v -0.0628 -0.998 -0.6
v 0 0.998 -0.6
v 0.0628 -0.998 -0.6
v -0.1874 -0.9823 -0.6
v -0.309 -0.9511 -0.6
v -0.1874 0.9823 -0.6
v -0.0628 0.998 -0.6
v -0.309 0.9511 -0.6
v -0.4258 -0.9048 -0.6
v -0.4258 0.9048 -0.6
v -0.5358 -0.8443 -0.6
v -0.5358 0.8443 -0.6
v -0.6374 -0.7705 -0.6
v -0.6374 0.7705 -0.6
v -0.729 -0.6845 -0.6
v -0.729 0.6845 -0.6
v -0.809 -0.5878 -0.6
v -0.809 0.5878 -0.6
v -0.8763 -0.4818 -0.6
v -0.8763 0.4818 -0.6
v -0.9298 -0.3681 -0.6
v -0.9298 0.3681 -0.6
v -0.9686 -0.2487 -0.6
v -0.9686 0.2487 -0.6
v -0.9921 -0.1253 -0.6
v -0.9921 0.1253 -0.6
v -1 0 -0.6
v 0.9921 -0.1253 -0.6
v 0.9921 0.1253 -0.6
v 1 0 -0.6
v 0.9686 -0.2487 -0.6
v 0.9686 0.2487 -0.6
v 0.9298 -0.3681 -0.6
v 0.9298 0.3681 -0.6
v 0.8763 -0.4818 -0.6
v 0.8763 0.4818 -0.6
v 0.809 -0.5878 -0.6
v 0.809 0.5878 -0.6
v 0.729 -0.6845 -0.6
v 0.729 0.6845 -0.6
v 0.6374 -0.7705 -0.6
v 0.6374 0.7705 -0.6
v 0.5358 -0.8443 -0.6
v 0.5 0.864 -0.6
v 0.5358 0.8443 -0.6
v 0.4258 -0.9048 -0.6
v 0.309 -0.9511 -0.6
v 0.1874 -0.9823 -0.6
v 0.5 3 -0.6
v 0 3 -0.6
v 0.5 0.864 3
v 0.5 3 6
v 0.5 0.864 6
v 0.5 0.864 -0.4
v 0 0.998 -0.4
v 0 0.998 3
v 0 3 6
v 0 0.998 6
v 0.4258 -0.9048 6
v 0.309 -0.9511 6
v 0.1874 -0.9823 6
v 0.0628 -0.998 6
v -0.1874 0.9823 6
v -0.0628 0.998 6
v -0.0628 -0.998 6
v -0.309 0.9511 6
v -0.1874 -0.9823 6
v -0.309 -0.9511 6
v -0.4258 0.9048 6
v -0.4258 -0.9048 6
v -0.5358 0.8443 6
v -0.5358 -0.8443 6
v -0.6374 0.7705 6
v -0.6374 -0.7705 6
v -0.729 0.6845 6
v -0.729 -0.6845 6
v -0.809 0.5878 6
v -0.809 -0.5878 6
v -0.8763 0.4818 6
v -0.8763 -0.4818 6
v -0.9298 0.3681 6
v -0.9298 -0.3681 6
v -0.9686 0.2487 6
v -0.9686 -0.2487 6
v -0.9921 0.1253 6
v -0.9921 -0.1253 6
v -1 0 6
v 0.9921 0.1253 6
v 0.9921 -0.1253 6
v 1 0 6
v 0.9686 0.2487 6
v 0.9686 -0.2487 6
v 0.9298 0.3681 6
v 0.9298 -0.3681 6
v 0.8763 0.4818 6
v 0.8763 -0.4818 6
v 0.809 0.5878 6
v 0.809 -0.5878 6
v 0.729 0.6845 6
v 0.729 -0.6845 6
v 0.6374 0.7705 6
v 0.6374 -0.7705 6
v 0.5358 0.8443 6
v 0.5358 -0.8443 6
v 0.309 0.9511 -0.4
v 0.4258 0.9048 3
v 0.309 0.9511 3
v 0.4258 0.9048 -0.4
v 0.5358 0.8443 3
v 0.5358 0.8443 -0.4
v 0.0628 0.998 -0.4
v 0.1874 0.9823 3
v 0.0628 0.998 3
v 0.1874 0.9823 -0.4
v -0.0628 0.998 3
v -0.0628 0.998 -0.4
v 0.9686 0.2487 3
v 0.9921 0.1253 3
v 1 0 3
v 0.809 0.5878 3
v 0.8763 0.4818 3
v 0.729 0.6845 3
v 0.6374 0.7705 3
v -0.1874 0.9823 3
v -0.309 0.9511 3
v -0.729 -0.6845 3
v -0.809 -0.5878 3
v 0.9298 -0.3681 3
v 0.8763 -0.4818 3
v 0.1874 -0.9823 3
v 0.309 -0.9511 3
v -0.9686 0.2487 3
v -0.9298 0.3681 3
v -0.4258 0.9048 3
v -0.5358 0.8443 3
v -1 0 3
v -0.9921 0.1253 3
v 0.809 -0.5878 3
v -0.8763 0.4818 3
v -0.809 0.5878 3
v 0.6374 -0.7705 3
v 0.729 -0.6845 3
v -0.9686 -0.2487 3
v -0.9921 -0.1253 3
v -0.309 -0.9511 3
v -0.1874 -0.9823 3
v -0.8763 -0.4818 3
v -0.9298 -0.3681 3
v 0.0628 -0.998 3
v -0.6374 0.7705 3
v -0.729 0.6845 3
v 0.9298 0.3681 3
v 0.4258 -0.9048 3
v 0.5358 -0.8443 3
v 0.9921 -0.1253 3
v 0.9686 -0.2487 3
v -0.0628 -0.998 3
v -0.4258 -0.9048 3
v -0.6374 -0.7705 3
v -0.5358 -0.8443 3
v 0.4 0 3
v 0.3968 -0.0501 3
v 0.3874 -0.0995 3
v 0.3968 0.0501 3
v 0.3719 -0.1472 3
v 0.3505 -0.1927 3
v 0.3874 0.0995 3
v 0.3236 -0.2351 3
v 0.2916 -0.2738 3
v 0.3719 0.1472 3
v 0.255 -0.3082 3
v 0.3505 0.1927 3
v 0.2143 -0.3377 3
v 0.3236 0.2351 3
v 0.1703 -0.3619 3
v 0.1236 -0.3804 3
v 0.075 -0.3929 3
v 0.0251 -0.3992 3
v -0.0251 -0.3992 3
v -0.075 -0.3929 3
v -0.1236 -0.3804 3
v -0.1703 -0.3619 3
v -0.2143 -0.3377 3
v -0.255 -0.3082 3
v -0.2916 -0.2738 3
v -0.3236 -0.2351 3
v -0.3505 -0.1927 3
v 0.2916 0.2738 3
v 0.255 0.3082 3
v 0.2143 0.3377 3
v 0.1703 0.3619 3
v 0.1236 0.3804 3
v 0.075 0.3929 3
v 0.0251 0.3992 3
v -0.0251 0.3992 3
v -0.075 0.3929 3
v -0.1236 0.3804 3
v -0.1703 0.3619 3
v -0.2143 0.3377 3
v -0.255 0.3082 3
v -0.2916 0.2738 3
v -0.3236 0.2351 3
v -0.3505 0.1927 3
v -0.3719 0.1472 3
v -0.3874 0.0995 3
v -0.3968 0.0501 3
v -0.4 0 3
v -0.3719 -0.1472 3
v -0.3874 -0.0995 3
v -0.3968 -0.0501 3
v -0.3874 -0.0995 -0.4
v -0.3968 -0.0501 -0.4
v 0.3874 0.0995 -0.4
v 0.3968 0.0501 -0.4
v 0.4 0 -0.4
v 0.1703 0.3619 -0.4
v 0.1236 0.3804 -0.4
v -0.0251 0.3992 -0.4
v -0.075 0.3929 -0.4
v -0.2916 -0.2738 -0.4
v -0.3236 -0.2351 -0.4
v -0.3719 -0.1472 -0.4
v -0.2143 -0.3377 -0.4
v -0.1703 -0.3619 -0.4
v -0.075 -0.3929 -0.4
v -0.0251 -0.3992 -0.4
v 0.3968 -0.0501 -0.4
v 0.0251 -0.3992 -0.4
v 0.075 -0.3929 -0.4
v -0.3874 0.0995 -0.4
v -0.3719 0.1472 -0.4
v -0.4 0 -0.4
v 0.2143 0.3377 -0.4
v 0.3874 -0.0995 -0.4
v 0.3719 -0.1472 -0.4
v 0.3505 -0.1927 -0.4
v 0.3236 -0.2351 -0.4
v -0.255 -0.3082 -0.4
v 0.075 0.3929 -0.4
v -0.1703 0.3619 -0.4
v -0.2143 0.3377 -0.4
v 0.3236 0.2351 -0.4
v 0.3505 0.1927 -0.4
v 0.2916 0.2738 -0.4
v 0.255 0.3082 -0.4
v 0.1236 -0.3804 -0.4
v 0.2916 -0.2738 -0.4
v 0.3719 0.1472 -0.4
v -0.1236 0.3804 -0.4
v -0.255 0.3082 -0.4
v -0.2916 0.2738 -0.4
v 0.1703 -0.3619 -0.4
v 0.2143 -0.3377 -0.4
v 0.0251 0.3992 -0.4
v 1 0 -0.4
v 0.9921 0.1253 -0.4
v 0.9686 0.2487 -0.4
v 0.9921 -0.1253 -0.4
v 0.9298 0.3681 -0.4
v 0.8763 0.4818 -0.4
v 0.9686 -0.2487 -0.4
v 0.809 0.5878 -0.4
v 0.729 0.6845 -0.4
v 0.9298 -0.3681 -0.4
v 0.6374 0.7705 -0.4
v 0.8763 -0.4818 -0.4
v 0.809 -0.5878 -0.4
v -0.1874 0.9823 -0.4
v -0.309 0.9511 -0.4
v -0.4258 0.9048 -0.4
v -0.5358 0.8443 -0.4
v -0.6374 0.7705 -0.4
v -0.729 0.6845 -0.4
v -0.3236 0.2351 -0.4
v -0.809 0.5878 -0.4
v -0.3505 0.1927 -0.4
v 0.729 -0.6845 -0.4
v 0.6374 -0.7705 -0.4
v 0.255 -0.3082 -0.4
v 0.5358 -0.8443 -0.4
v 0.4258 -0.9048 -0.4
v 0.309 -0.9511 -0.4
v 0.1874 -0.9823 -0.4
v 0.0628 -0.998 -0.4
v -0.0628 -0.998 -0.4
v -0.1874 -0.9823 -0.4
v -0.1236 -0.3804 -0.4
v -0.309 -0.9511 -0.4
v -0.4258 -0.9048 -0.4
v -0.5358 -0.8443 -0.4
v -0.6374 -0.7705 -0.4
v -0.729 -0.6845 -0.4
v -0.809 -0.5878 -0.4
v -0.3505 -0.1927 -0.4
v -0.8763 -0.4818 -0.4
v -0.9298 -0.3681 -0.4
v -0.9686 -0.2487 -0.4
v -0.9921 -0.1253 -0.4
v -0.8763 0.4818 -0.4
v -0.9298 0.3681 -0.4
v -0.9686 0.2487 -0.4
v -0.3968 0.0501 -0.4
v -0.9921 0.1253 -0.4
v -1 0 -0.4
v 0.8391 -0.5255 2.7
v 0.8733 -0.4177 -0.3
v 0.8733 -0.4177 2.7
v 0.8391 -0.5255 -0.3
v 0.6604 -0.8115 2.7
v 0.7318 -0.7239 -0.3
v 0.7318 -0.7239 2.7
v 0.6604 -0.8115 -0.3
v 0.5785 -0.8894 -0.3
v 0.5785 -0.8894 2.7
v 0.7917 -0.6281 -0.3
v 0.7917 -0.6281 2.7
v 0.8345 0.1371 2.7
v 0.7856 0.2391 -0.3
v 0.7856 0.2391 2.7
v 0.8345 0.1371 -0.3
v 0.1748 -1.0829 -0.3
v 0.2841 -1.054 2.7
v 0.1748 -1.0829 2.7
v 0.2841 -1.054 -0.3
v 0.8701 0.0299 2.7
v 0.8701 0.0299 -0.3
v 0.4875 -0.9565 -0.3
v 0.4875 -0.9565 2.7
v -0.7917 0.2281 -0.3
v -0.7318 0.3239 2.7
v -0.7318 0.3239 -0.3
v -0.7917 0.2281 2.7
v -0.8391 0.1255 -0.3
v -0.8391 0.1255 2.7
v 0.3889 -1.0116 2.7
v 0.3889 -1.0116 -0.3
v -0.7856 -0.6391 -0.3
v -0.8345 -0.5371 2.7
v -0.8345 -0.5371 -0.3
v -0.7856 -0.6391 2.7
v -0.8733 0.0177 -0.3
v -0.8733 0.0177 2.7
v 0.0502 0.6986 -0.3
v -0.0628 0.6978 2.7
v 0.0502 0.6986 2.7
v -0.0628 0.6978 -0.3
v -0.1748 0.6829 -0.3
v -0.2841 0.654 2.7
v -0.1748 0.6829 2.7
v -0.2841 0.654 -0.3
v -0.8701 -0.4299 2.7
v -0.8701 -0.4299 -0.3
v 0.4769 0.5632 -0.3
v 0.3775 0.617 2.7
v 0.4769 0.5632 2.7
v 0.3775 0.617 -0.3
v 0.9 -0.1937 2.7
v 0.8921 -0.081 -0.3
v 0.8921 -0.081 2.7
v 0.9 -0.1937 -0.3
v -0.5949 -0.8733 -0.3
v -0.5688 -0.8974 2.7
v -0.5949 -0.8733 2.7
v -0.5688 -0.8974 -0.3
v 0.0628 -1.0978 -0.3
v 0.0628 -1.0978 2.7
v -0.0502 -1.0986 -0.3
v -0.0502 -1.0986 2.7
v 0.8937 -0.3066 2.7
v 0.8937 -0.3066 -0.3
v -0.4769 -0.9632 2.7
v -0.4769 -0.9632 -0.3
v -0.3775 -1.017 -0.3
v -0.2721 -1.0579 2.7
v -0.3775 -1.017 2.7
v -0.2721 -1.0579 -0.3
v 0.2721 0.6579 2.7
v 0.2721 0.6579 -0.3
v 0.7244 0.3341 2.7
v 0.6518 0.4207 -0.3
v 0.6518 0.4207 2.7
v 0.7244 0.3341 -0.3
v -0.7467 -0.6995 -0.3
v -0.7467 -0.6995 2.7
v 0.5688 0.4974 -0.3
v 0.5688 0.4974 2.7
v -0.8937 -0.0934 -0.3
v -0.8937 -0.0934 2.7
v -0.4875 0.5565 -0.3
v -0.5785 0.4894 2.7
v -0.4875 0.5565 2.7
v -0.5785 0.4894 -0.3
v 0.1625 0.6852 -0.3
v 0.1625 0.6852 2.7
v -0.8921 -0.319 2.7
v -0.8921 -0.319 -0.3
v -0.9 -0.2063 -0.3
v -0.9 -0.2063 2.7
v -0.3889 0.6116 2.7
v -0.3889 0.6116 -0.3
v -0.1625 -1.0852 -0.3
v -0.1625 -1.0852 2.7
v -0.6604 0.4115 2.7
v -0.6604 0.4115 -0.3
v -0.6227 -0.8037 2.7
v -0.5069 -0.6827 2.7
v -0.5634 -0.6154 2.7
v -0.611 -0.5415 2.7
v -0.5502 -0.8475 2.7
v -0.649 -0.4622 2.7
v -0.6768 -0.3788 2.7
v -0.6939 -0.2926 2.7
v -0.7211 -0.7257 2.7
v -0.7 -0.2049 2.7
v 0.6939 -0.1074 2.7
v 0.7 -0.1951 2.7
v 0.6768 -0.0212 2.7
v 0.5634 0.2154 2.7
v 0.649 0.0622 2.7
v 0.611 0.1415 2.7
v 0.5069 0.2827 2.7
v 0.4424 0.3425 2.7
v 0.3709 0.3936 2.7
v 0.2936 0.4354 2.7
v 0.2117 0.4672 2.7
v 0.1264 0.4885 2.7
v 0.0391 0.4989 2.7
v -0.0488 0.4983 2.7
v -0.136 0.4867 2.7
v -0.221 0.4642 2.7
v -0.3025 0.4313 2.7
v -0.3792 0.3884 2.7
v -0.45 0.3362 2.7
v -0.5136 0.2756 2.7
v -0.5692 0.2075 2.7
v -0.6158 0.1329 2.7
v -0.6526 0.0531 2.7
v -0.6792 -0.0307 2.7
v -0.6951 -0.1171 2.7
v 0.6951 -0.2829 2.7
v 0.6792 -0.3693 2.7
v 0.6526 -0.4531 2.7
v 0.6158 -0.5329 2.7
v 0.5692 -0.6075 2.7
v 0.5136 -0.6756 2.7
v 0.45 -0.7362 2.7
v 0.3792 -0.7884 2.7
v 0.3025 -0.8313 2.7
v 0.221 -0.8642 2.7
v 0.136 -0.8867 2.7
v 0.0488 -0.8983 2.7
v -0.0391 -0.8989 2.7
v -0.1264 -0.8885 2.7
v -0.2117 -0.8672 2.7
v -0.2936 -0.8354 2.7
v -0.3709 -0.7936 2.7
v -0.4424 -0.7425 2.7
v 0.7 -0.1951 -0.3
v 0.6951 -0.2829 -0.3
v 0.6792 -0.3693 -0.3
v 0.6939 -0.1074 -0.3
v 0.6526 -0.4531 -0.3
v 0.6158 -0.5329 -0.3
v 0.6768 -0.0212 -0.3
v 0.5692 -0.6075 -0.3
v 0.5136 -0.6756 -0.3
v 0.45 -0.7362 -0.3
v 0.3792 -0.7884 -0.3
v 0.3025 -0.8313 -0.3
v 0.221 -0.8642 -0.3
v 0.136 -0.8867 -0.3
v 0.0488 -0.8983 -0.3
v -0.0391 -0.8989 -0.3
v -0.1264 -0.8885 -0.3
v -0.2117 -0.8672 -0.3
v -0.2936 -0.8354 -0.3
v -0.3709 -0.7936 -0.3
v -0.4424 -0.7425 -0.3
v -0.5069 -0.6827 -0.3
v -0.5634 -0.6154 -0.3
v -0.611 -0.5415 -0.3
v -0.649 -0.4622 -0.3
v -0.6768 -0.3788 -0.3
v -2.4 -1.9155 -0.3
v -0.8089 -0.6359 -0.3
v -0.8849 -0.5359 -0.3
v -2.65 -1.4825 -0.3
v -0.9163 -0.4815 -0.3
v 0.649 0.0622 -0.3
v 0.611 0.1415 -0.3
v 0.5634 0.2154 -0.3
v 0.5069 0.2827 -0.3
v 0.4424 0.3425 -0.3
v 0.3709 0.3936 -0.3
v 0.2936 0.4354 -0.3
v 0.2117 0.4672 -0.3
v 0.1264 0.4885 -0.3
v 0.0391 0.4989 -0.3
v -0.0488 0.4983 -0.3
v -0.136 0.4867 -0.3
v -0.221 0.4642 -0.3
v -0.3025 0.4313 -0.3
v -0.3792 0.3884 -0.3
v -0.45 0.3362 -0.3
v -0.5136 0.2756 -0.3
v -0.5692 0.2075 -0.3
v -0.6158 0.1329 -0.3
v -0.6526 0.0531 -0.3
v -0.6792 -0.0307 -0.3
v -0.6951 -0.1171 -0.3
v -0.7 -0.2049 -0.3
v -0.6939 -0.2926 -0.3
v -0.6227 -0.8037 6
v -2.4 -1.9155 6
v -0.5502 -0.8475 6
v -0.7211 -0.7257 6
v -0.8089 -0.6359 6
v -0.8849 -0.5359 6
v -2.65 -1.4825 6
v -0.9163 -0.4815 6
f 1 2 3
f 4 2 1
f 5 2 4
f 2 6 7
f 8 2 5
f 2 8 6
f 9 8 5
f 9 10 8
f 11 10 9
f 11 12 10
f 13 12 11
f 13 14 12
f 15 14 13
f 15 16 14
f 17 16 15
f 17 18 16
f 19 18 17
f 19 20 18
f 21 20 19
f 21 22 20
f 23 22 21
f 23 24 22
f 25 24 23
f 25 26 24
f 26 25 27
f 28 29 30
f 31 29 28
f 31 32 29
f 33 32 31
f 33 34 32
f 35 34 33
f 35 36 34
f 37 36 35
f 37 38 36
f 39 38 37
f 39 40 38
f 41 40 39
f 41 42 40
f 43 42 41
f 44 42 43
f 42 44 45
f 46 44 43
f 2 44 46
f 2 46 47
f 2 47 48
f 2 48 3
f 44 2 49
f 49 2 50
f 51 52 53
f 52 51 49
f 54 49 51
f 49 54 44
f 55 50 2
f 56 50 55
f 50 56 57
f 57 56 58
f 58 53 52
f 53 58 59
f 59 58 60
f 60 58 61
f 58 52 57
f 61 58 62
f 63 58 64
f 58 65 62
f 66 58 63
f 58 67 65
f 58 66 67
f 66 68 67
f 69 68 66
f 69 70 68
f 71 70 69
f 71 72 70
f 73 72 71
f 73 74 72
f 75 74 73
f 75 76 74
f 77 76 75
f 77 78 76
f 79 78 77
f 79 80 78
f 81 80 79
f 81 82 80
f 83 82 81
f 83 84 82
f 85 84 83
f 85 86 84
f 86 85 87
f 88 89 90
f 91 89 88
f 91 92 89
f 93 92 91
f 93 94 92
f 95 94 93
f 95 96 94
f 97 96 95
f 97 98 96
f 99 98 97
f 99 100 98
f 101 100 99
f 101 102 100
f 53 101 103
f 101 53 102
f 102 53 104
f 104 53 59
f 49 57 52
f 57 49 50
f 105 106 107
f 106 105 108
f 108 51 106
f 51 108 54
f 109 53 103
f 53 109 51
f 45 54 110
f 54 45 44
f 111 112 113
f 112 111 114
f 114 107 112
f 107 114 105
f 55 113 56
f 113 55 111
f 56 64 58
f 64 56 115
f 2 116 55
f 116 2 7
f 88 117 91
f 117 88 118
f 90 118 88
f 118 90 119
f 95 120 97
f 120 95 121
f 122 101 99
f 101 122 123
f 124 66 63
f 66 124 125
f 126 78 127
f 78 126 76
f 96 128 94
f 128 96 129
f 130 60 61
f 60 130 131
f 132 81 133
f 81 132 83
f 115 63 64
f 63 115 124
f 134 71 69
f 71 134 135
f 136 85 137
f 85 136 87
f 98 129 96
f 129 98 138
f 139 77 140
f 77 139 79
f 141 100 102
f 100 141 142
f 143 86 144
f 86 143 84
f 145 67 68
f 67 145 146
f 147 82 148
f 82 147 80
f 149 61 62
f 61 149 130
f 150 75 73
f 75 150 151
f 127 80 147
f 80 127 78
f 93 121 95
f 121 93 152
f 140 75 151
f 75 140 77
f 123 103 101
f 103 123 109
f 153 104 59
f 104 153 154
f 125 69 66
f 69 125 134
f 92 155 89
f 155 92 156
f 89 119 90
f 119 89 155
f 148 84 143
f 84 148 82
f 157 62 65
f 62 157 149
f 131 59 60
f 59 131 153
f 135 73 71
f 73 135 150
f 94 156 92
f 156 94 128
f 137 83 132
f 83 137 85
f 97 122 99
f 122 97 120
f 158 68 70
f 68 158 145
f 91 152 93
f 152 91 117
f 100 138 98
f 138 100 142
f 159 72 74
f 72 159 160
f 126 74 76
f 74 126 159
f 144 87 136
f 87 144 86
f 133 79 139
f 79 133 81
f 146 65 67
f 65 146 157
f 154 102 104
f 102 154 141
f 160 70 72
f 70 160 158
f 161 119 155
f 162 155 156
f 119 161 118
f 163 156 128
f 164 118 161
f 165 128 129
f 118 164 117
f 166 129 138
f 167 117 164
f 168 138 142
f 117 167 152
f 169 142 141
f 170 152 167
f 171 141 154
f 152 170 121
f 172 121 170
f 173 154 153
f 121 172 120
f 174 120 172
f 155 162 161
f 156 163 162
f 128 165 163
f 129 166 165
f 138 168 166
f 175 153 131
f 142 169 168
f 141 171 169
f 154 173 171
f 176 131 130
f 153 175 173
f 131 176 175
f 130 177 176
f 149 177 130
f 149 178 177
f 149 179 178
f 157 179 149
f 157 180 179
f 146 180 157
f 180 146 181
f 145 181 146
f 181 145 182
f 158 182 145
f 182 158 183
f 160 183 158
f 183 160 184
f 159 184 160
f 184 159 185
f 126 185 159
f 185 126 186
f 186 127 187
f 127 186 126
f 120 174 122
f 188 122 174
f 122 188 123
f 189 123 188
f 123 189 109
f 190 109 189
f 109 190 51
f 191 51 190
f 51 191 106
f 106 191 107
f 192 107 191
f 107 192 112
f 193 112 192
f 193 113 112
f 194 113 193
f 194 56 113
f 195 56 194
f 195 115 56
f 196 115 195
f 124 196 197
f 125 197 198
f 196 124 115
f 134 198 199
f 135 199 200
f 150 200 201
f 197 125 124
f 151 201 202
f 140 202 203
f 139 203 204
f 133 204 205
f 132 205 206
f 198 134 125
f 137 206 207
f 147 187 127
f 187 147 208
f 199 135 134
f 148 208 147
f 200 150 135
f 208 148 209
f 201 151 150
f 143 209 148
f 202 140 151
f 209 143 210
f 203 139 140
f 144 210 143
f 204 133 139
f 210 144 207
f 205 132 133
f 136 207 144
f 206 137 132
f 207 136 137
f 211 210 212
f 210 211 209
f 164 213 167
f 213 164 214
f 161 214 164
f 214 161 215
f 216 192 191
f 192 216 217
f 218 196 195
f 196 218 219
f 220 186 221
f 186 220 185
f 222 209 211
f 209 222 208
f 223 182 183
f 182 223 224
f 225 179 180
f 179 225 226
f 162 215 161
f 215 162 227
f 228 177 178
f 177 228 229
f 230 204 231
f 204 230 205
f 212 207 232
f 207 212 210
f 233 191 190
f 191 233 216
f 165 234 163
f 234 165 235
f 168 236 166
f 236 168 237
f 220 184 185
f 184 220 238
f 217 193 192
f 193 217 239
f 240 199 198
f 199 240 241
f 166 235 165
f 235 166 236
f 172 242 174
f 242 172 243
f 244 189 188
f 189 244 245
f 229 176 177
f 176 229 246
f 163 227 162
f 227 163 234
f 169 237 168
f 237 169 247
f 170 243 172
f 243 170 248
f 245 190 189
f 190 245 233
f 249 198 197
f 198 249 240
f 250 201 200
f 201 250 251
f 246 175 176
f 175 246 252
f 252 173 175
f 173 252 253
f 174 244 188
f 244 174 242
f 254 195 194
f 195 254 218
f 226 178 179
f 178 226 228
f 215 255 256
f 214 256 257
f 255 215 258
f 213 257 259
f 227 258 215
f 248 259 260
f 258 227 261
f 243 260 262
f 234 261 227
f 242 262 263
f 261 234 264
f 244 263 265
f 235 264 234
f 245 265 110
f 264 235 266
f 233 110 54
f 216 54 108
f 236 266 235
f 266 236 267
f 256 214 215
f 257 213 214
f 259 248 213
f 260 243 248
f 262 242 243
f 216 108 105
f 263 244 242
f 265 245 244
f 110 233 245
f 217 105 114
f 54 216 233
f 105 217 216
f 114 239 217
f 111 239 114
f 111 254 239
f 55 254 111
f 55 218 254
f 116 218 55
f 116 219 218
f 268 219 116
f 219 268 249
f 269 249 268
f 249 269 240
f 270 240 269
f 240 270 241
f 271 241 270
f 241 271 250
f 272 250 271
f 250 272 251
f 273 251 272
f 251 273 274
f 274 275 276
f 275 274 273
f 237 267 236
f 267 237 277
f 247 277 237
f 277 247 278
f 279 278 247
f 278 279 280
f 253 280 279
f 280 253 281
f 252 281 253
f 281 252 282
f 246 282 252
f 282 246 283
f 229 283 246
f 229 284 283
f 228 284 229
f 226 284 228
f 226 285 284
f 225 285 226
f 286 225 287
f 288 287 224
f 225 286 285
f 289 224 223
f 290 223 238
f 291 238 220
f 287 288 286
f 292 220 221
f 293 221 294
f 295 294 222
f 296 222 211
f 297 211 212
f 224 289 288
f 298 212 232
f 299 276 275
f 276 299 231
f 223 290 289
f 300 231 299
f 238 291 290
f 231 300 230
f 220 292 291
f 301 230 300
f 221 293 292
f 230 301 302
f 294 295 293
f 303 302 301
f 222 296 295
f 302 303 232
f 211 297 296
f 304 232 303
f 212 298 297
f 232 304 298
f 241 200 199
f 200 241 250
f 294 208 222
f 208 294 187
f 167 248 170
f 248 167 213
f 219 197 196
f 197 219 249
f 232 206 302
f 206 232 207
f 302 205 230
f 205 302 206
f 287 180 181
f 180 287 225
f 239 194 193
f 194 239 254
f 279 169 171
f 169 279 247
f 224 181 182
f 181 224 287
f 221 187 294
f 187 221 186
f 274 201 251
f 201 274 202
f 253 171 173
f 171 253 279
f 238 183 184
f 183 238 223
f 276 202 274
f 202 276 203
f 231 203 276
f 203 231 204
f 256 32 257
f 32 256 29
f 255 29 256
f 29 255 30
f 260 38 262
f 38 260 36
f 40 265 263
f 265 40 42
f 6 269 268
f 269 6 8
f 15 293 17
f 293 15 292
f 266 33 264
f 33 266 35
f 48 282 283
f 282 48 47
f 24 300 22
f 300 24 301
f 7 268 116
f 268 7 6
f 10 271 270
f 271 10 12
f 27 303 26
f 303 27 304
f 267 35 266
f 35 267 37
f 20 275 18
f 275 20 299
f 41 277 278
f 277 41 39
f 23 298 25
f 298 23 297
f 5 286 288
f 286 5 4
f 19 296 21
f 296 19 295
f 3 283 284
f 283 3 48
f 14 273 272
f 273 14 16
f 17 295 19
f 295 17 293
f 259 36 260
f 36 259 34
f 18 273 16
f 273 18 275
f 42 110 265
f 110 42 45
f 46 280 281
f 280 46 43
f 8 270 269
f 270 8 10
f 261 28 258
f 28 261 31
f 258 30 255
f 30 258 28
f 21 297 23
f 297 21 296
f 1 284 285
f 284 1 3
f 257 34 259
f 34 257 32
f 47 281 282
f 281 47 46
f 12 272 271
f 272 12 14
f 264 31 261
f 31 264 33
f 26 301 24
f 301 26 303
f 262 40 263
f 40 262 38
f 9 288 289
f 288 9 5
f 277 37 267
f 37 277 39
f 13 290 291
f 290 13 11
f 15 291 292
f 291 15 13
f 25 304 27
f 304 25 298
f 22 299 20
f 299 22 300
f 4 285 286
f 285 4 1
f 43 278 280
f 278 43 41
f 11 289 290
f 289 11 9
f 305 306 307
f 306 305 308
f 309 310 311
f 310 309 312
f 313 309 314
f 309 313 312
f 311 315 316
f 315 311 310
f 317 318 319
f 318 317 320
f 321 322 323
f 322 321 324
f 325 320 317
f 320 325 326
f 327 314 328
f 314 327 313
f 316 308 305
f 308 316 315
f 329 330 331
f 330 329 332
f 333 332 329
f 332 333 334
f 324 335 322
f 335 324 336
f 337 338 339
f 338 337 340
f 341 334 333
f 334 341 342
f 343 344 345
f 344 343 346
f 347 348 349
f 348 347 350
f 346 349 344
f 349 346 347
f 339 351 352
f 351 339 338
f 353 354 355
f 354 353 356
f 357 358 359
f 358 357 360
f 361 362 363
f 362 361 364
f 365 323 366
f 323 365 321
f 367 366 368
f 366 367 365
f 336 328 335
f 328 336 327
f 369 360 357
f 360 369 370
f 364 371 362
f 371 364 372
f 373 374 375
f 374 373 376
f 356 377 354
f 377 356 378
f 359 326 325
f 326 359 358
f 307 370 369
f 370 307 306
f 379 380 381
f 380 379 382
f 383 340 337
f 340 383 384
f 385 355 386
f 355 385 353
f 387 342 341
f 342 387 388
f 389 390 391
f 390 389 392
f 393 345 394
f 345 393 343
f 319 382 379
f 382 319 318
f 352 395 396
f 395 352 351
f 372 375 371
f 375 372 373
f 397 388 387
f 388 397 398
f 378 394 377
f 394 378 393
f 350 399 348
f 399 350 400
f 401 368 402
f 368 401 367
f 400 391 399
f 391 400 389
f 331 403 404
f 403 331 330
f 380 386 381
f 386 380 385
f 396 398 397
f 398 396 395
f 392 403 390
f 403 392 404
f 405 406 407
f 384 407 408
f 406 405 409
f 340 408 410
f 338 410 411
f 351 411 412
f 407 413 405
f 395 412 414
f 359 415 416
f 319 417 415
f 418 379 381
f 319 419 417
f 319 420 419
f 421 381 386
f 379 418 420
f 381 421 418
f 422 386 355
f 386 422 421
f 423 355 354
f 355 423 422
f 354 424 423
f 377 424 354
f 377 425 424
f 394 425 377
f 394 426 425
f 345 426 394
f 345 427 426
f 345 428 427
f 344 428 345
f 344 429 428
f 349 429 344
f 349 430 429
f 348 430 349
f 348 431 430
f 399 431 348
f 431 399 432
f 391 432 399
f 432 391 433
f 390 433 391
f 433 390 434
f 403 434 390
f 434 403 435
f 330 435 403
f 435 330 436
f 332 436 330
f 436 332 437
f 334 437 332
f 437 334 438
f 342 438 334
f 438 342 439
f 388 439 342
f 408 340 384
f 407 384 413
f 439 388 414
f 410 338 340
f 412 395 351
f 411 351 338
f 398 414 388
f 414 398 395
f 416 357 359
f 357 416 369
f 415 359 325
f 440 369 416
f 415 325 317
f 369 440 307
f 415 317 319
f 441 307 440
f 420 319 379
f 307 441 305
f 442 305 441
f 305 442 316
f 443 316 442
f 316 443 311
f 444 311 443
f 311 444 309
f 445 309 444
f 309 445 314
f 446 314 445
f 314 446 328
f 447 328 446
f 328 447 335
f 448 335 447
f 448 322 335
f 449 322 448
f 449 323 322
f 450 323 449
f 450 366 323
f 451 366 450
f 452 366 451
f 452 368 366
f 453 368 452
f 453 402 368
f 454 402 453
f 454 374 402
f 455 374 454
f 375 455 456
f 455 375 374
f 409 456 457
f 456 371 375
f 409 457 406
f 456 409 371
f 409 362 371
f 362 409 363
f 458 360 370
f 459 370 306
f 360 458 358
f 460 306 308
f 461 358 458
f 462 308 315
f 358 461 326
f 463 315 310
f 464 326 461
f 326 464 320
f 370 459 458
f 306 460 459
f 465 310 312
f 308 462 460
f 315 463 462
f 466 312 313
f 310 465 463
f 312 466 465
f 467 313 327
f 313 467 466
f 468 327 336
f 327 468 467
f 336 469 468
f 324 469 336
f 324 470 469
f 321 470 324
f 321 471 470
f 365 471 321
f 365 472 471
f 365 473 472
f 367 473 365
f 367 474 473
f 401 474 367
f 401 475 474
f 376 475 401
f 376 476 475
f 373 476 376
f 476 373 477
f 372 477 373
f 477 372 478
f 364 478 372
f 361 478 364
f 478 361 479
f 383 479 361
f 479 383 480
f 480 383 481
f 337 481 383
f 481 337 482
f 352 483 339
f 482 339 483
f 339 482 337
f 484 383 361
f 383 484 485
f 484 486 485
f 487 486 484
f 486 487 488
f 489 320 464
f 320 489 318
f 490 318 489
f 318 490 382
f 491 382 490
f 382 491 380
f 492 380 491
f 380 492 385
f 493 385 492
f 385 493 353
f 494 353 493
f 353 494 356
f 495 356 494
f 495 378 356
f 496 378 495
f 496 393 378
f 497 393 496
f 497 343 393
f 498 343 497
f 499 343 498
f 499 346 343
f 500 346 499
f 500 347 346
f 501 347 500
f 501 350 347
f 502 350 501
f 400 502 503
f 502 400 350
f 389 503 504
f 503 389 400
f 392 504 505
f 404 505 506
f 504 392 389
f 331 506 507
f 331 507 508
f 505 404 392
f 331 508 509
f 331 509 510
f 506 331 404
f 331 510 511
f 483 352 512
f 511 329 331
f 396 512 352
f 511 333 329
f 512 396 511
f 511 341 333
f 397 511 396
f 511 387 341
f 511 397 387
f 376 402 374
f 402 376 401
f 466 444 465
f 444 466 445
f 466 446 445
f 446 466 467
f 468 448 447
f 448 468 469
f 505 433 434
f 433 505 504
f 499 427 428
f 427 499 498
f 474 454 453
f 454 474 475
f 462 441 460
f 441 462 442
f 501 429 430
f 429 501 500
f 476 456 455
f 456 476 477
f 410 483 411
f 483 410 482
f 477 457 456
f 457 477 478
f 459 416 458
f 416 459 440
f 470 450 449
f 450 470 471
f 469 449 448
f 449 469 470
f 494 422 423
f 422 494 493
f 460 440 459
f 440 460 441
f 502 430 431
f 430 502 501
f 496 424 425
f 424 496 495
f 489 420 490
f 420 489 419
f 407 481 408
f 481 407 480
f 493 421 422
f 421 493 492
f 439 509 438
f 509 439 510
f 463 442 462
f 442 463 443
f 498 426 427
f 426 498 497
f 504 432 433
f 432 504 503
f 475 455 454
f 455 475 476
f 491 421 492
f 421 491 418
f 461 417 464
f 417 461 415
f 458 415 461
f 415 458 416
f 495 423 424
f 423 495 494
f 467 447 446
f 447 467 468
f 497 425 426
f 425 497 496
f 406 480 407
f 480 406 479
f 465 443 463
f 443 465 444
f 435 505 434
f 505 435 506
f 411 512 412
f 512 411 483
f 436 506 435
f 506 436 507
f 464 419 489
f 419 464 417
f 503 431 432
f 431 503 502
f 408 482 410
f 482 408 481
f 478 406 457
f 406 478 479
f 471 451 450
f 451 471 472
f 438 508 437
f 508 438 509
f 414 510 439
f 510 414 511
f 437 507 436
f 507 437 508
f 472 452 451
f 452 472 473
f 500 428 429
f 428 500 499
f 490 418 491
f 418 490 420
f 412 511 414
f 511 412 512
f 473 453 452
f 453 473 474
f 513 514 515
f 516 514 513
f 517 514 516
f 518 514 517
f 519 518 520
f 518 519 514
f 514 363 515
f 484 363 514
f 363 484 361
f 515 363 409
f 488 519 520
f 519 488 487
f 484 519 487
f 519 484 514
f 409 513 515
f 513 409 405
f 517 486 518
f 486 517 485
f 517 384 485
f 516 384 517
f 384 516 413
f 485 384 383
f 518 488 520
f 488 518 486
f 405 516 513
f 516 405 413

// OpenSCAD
module block_long() { //long block
	difference(){
		cube([6.6, 3, 0.5]);
		
		translate([-1,0,0])
			rotate([0,270,180])
			cylinder(h=8, r=1, $fn=50);
	}
}

module block_short() { //short block
	difference(){
		cube([6.3, 3, 0.5]);
		
		translate([-0.5,0,0])
			rotate([0,270,180])
			cylinder(h=8, r=1, $fn=50);
	}
}

module cylinder_bottom(){
	difference(){
		cylinder(h=3, r=0.9, $fn=50);

		translate([0,0,-1])
			cylinder(h=8, r=0.7, $fn=50);
	}

	translate([-.2, .1, 0])
	rotate([0,270, 170])
		block_short();
}

module cylinder_top(){

	translate([0,0,3])
		cylinder(h=3, r=1, $fn=50);
	translate([0,0,-.4]) //innder dowel
		cylinder(h=6.4, r=.4, $fn=50);

	translate([0, 0, 6])
		rotate([0,90,0])
			block_long();
	translate([0,0,-.6])

	cylinder(h=.2, r=1, $fn=50);
}

//intersection(){
	color("blue")
		cylinder_top();

	translate([0,-.2,-0.3])
		rotate([0,0, -50])
		cylinder_bottom();
//}
